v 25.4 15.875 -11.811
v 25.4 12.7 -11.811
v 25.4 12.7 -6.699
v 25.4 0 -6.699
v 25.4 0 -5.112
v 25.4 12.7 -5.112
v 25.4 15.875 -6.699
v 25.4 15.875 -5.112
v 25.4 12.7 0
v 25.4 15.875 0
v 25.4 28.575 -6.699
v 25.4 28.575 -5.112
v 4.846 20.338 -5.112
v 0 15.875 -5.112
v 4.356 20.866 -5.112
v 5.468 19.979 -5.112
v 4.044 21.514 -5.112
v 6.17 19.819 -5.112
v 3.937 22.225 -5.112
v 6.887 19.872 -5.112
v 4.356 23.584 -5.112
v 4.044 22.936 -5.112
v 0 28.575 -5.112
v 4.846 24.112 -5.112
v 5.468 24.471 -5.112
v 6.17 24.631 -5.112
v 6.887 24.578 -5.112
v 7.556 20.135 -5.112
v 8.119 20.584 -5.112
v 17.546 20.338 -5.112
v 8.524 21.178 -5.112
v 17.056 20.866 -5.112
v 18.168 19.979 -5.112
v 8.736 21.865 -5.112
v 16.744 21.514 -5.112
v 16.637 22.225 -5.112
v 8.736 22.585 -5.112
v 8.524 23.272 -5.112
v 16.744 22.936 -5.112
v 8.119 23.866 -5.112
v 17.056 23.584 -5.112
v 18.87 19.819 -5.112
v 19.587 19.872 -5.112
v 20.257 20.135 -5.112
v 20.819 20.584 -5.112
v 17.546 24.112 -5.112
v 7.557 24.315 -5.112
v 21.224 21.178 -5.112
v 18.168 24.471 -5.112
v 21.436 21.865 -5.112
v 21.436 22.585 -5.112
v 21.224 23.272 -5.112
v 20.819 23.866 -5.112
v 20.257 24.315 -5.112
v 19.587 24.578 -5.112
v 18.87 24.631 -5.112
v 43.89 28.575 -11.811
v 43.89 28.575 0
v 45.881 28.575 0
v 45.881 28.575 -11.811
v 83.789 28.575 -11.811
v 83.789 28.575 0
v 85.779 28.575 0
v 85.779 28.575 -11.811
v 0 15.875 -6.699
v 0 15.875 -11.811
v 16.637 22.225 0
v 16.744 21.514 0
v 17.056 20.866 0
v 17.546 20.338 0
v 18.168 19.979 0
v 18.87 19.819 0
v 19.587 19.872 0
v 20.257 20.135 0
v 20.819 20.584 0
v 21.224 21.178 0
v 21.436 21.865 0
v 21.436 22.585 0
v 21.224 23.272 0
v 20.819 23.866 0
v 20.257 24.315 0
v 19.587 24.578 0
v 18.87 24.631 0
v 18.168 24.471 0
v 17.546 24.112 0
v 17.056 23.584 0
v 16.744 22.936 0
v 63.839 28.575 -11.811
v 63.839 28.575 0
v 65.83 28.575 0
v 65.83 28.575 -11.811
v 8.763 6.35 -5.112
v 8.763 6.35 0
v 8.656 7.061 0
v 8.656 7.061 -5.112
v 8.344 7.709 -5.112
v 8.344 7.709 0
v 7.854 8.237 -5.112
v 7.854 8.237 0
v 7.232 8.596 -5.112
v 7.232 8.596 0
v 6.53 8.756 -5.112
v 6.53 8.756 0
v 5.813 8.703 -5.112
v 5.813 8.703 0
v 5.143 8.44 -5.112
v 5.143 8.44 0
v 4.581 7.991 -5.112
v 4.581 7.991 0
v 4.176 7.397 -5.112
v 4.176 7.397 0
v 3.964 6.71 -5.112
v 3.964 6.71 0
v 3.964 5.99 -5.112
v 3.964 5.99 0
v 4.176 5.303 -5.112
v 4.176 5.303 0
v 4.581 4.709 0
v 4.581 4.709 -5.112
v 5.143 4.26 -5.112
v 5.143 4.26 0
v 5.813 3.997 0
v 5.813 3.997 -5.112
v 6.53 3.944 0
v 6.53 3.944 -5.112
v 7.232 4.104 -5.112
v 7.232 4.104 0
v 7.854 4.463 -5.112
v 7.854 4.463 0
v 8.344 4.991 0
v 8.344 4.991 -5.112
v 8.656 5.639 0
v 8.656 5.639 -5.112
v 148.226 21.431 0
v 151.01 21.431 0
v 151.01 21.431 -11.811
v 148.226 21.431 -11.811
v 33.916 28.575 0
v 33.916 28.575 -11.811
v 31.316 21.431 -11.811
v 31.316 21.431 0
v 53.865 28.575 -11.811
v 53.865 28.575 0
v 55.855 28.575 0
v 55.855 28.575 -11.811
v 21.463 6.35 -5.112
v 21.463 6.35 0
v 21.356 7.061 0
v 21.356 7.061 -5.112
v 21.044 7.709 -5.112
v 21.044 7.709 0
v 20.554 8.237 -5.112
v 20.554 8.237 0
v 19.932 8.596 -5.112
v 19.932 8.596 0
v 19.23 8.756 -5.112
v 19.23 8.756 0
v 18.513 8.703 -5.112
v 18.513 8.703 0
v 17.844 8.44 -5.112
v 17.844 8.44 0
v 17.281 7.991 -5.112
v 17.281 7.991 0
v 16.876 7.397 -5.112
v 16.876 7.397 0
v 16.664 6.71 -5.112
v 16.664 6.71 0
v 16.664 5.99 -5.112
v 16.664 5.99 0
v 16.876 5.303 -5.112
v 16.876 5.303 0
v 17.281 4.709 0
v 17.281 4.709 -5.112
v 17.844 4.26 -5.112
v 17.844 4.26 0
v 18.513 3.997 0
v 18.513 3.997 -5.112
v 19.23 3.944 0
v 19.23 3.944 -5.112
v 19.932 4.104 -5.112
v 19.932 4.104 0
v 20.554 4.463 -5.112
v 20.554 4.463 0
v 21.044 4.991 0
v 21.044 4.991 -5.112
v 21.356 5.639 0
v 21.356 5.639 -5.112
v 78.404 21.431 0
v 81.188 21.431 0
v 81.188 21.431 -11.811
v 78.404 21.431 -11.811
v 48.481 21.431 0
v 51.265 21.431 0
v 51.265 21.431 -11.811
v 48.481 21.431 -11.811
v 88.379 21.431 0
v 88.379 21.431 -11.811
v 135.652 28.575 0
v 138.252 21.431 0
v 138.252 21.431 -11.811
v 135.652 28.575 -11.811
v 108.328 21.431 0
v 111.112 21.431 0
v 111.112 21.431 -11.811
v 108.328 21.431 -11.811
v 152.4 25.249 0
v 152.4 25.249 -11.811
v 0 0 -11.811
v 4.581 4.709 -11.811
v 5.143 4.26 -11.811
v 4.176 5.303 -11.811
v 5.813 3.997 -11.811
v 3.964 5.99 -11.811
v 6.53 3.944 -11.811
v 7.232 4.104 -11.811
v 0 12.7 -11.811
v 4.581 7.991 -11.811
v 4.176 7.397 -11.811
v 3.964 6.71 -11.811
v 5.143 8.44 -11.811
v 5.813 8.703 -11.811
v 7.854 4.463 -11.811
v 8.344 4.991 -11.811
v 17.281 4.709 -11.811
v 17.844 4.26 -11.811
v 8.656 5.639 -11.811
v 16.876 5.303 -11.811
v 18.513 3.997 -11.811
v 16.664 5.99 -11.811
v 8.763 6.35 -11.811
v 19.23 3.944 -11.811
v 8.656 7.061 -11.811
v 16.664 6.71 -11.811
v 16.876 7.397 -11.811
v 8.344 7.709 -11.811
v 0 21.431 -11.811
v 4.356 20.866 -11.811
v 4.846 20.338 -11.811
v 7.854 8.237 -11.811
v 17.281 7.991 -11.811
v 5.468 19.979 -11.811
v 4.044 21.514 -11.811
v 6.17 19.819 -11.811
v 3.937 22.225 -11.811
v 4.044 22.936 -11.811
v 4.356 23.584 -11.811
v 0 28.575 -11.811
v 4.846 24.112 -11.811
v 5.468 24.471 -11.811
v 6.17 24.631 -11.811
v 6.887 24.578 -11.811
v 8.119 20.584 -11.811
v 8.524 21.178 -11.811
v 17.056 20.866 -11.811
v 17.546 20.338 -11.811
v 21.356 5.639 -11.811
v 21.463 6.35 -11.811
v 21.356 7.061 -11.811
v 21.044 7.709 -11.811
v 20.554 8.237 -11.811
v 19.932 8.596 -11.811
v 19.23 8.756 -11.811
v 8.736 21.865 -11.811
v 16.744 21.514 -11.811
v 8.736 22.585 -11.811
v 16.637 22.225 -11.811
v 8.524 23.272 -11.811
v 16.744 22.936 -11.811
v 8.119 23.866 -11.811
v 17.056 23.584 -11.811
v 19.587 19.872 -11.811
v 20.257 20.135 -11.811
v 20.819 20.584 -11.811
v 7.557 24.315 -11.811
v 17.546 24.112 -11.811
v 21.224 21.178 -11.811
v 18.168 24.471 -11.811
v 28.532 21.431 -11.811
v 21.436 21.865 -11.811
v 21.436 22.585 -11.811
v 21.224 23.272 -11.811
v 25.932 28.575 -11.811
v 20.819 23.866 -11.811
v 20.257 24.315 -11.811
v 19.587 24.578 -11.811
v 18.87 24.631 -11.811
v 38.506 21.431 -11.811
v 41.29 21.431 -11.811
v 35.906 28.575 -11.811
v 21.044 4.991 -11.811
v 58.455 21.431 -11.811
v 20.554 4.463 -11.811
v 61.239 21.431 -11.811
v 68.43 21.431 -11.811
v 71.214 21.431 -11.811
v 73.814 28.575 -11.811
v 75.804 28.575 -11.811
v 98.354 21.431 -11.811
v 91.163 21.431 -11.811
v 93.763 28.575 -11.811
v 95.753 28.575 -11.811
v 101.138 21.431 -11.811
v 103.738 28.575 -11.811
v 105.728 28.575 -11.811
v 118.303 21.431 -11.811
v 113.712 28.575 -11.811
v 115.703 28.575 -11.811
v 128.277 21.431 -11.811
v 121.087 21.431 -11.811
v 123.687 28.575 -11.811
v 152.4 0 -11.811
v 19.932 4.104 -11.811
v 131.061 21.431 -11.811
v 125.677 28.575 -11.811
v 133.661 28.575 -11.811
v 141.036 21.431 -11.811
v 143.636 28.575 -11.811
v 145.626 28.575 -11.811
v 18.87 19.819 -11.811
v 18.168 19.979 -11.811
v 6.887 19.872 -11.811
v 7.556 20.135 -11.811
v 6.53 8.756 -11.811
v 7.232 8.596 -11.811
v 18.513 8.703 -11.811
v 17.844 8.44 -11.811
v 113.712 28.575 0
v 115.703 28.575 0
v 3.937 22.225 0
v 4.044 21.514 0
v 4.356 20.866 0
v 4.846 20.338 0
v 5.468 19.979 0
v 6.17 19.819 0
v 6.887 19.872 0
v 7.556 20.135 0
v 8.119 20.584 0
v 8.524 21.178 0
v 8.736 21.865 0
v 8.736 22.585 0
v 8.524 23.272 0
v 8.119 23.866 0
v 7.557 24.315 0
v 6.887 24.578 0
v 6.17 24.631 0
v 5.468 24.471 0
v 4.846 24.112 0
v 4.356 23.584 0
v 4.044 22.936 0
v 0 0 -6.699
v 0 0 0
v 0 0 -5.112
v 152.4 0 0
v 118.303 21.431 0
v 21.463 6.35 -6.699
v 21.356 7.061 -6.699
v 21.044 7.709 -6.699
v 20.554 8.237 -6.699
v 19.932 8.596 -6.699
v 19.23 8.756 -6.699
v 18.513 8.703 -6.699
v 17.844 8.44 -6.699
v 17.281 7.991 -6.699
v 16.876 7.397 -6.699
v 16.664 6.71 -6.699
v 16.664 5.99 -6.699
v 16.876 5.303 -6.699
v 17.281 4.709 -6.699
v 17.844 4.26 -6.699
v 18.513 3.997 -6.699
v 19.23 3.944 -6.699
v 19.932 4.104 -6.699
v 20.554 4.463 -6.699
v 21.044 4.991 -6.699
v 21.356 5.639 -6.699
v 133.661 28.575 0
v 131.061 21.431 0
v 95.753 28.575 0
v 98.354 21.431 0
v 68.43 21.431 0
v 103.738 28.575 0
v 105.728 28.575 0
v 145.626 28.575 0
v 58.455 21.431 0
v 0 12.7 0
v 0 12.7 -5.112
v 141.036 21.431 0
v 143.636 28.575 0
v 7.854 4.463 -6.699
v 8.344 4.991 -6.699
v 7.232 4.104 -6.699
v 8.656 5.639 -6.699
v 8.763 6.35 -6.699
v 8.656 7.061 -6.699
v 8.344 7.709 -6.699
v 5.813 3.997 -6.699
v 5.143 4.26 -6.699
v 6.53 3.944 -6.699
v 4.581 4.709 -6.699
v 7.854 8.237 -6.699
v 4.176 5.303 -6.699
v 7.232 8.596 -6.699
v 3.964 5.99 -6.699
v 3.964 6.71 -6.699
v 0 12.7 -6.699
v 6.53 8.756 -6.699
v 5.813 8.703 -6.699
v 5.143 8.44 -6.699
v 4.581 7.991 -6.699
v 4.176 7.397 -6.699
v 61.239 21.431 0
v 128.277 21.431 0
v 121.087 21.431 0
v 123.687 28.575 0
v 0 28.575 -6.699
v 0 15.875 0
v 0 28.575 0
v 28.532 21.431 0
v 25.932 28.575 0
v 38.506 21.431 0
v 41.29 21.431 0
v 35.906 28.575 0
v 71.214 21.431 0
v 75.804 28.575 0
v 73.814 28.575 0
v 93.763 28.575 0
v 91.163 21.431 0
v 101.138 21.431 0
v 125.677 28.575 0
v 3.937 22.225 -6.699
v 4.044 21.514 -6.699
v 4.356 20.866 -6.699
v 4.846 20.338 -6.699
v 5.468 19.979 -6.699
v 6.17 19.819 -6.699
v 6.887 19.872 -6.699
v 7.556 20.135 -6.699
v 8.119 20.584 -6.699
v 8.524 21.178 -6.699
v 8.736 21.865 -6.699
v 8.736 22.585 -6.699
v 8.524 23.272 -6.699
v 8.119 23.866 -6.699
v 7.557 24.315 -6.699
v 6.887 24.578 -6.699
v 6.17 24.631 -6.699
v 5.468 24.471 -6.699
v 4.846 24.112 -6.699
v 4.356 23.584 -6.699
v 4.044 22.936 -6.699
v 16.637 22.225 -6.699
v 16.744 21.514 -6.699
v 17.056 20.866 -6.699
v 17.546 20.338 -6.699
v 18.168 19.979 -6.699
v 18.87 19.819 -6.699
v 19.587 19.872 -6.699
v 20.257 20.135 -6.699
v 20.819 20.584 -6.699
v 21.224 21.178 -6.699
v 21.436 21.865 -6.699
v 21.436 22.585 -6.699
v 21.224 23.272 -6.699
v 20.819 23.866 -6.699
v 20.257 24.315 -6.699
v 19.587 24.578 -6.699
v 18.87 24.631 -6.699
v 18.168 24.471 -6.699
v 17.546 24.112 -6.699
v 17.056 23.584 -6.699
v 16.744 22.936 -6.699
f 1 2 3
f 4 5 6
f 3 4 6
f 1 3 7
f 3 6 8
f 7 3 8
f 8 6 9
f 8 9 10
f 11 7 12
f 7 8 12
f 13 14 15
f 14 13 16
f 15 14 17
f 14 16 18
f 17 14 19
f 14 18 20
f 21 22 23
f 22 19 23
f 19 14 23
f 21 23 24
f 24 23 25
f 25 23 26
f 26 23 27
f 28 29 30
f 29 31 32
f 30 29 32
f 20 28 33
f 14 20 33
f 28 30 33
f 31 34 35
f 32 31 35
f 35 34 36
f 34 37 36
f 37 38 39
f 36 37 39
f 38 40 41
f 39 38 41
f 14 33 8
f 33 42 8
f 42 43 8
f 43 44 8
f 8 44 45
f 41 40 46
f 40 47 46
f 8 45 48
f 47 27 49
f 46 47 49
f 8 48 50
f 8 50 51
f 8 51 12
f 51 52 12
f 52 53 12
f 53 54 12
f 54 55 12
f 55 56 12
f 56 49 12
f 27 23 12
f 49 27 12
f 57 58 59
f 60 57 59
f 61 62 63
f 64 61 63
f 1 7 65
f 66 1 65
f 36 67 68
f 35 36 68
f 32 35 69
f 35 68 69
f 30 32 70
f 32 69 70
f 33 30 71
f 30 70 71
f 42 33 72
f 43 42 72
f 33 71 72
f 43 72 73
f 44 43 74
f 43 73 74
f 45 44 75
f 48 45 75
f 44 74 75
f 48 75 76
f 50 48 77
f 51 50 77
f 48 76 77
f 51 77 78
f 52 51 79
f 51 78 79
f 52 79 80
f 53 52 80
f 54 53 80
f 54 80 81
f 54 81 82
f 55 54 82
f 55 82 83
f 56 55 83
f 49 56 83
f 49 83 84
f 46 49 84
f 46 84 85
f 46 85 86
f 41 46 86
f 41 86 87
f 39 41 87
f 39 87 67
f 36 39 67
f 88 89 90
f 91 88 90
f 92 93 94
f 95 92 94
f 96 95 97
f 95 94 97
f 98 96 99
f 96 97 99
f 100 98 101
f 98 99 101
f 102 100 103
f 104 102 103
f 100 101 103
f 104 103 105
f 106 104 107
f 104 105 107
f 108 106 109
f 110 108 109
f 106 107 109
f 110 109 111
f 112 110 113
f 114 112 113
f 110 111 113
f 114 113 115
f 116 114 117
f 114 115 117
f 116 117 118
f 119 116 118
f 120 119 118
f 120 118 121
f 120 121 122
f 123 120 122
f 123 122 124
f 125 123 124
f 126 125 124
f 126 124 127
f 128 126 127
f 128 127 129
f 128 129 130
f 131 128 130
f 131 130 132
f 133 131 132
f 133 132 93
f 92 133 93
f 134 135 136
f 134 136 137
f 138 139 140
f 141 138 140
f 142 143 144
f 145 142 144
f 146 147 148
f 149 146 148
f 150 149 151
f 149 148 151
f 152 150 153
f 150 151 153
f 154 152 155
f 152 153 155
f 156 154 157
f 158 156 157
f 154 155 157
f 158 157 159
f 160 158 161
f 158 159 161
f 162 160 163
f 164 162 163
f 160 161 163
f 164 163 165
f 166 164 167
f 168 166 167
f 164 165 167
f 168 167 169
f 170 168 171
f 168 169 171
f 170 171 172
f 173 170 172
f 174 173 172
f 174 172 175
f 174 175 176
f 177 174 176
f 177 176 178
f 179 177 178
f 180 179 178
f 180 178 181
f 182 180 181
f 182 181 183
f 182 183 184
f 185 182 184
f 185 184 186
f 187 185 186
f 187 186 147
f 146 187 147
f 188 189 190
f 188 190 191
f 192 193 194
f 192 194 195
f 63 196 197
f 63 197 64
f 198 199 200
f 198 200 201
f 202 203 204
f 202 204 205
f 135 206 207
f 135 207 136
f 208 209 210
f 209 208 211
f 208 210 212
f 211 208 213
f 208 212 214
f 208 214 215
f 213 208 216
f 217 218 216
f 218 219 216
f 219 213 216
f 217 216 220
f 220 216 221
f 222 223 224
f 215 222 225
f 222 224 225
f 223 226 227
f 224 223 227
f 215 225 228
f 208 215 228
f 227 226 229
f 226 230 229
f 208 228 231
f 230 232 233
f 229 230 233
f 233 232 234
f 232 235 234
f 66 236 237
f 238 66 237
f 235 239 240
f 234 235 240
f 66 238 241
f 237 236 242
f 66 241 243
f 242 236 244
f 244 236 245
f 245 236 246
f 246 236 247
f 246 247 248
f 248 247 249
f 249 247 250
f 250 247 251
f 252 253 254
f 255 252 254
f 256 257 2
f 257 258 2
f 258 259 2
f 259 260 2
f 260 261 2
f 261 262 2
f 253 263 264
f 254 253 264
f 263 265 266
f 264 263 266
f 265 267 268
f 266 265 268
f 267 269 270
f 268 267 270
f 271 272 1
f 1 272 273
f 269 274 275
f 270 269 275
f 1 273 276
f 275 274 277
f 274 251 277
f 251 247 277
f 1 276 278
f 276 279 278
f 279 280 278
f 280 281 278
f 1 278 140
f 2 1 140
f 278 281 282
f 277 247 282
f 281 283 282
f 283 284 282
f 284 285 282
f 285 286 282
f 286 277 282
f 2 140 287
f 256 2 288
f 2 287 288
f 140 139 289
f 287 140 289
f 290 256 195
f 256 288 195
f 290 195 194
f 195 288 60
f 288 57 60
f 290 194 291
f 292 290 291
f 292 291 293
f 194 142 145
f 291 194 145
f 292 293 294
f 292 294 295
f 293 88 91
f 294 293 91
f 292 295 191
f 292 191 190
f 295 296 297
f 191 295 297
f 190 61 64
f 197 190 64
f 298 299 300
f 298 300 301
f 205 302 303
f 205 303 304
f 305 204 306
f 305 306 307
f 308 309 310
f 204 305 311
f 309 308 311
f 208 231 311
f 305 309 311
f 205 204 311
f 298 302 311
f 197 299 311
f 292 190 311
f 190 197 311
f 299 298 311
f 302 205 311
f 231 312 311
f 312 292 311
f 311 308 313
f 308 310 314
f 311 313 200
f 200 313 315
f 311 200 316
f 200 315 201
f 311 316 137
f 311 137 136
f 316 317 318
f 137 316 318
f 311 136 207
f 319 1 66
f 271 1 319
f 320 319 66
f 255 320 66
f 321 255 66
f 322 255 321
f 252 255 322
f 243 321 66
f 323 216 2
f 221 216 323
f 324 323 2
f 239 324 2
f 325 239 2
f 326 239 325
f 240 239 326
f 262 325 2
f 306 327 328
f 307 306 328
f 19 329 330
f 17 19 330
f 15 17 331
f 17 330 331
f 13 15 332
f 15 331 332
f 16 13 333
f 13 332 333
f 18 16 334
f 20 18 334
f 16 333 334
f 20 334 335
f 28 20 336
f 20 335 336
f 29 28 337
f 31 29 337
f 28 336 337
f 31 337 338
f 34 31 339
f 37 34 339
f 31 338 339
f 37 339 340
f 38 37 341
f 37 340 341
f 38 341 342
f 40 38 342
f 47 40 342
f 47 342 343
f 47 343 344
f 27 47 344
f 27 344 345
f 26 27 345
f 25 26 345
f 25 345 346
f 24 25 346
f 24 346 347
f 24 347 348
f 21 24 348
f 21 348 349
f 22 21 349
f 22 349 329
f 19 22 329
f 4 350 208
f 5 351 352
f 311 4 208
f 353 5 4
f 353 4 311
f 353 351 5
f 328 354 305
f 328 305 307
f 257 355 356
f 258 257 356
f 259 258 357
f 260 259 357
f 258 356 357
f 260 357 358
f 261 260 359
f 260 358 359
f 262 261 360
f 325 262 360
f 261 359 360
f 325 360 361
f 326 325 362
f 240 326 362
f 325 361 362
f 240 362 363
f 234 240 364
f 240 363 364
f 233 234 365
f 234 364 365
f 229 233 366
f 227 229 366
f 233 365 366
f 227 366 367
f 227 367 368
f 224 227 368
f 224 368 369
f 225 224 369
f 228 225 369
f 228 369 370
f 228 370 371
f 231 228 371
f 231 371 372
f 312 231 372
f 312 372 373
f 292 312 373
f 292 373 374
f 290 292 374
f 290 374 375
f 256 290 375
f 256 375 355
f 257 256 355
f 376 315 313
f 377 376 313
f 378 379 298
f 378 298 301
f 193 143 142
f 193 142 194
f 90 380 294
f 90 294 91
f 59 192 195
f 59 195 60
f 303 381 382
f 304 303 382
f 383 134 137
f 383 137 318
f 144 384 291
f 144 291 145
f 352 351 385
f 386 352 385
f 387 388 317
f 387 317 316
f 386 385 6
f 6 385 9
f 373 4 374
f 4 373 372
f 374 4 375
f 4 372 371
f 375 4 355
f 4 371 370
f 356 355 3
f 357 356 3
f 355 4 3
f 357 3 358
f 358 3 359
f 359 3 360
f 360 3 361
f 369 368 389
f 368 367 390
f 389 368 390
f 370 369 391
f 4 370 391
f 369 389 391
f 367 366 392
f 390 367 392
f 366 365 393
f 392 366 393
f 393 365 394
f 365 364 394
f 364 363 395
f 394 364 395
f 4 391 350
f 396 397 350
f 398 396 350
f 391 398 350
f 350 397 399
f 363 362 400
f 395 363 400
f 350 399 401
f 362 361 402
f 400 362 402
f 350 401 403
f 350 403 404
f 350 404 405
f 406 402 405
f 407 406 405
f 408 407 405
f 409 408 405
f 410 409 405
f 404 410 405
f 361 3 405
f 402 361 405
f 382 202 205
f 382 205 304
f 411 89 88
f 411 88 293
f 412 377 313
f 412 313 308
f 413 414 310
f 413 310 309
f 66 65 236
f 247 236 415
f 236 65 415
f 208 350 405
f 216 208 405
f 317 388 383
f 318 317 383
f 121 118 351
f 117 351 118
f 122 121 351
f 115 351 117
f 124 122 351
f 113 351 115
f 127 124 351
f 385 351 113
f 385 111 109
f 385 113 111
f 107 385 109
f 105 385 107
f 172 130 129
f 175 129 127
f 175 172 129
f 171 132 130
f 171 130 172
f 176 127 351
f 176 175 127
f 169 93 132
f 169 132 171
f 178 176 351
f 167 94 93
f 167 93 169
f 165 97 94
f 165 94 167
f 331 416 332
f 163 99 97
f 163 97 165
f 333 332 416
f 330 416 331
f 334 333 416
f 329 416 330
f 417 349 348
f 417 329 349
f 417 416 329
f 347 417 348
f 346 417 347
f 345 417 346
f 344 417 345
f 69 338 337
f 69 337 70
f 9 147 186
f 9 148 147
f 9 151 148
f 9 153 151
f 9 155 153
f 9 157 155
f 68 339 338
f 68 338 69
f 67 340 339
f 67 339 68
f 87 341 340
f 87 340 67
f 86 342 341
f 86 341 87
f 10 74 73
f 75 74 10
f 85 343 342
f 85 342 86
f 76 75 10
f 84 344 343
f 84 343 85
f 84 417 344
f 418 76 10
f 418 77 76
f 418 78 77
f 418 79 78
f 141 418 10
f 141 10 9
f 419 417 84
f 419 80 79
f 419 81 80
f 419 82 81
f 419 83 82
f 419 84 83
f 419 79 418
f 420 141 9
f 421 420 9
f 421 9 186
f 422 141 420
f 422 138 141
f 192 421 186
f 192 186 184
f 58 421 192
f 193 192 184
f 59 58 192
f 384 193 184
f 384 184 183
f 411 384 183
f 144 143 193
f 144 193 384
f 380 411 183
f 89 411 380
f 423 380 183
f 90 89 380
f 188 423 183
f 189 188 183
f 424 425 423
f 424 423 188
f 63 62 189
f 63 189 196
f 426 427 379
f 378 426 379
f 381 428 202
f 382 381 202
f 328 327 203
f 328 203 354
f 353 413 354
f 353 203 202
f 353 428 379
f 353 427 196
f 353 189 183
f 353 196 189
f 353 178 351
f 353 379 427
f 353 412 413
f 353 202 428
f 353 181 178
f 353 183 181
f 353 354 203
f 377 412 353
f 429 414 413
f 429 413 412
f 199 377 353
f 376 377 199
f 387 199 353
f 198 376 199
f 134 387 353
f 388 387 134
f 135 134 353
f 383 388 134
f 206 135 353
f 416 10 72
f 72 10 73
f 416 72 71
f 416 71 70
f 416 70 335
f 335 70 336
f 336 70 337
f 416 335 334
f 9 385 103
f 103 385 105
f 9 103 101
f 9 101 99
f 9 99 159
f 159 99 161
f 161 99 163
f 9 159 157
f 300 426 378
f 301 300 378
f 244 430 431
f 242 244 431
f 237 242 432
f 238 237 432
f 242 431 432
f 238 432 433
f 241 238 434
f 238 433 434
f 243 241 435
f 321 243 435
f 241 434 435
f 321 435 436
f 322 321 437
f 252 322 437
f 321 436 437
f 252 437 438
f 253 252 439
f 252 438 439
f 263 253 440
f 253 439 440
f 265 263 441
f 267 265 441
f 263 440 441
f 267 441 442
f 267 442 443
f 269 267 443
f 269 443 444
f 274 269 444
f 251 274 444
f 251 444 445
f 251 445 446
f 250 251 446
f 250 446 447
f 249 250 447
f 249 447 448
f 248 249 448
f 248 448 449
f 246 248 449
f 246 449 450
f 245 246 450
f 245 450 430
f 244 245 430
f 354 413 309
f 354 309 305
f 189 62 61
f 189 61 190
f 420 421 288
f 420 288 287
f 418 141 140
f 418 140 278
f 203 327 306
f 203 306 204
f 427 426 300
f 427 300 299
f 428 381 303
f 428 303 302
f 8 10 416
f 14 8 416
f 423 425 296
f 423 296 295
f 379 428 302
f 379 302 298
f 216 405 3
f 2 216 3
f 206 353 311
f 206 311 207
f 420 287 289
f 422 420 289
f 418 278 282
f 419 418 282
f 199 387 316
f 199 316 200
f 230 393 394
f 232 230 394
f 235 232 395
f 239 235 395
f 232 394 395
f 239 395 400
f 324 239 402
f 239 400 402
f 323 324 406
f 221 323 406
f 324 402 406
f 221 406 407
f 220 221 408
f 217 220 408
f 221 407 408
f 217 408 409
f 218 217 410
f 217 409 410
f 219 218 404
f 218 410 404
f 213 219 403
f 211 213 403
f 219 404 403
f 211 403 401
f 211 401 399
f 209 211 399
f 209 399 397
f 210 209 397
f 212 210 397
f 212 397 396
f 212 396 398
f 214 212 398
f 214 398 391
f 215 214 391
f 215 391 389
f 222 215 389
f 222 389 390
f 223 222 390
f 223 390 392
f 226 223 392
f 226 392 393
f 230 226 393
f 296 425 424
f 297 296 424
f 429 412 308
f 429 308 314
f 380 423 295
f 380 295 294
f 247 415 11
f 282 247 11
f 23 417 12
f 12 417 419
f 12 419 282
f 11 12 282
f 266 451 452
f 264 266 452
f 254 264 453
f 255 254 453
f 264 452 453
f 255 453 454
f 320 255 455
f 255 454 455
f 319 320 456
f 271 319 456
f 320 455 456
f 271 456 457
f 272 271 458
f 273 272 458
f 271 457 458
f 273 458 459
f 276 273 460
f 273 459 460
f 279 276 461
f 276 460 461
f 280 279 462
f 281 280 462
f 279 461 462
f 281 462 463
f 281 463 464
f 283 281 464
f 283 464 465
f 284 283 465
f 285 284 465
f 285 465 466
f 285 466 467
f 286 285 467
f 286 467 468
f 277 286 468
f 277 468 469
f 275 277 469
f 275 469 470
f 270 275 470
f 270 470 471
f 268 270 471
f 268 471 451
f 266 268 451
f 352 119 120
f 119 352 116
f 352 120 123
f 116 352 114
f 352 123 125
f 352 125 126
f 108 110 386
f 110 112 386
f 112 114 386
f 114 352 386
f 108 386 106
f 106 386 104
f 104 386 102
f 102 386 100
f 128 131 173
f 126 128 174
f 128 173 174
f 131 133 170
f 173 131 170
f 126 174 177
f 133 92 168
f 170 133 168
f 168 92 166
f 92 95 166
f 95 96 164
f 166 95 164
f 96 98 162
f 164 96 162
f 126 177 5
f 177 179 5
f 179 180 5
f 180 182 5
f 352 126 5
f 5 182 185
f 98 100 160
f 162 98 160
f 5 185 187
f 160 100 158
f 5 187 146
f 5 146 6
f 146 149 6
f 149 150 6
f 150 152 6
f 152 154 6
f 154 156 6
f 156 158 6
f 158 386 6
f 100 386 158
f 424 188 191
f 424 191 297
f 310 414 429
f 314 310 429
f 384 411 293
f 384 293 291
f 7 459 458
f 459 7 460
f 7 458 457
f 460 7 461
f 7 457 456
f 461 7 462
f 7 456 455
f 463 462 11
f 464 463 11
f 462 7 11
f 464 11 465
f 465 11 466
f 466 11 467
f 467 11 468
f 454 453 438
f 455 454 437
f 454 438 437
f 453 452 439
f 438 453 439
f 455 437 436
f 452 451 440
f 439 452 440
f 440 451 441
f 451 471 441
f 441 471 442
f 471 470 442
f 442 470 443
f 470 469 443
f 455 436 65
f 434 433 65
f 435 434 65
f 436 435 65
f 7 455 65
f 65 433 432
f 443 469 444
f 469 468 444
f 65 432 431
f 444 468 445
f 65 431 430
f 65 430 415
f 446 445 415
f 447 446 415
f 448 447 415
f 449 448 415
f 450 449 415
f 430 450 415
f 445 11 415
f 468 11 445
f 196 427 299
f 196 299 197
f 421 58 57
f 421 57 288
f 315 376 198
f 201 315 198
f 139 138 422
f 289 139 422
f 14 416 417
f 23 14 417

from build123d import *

# Parameters (mm, degrees)
BLANKSKE_W              = 152.4
BLANKSKE_H              = 28.575
BLANK_DEPTH             = 11.811
TOOTHCUTSIM_DEPTH       = 156.504952802
TEETHCUTS_COUNT         = 16
TEETHCUTS_PITCH         = 9.974556664
SKETCH2_W               = 23.941257987
SKETCH2_H               = 28.575
BOSS_EXTRUDE1_DEPTH     = 11.811
CUT_EXTRUDE1_DEPTH      = 156.504952802
CUT_EXTRUDE1_DEPTH_BACK = 156.504952802
CUT_EXTRUDE5_DEPTH      = 156.504952802
CUT_EXTRUDE5_DEPTH_BACK = 156.504952802
SKETCH5_R               = 2.413
CUT_EXTRUDE6_DEPTH      = 12.446


with BuildPart() as part:
    # BlankSke → Blank (new body)
    with BuildSketch(Plane.XY):
        with Locations((76.2, 14.2875)):
            Rectangle(BLANKSKE_W, BLANKSKE_H)
    extrude(amount=-BLANK_DEPTH)

    # TooCutSkeSim → ToothCutSim (cut, through all)
    with BuildSketch(Plane.XY):
        Polygon((1.392032299, 21.43125), (-1.392032299, 21.43125), (-4.001389504, 28.6004), (4.001389504, 28.6004), align=None)
    toothcutsim = extrude(amount=-TOOTHCUTSIM_DEPTH, mode=Mode.SUBTRACT)

    # TeethCuts: ToothCutSim ×16
    with Locations(*[(i * TEETHCUTS_PITCH, 0, 0) for i in range(1, TEETHCUTS_COUNT)]):
        add(toothcutsim, mode=Mode.SUBTRACT)

    # Sketch2 → Boss-Extrude1 (add)
    with BuildSketch(Plane.XY):
        with Locations((11.970628994, 14.2875)):
            Rectangle(SKETCH2_W, SKETCH2_H)
    extrude(amount=-BOSS_EXTRUDE1_DEPTH)

    # Sketch3 → Cut-Extrude1 (cut, two sides)
    with BuildSketch(Plane.XY) as cut_extrude1_sk:
        Polygon((-316.449184205, 12.7), (0, 12.7), (25.4, 12.7), (25.4, 15.875), (0, 15.875), (-316.449184205, 15.875), (-949.347552615, 15.875), (-949.347552615, 12.7), align=None)
    extrude(amount=CUT_EXTRUDE1_DEPTH, mode=Mode.SUBTRACT)
    extrude(cut_extrude1_sk.sketch, amount=-CUT_EXTRUDE1_DEPTH_BACK, mode=Mode.SUBTRACT)

    # Sketch4 → Cut-Extrude5 (cut, two sides)
    with BuildSketch(Plane(origin=(0, 28.575, 0), x_dir=(1, 0, 0), z_dir=(0, 1, 0))) as cut_extrude5_sk:
        Polygon((-315.09434574, 6.69925), (0, 6.69925), (25.4, 6.69925), (25.4, 5.11175), (0, 5.11175), (-315.09434574, 5.11175), (-945.283037219, 5.11175), (-945.283037219, 6.69925), align=None)
    extrude(amount=CUT_EXTRUDE5_DEPTH, mode=Mode.SUBTRACT)
    extrude(cut_extrude5_sk.sketch, amount=-CUT_EXTRUDE5_DEPTH_BACK, mode=Mode.SUBTRACT)

    # Sketch5 → Cut-Extrude6 (cut)
    with BuildSketch(Plane.XY):
        with Locations(Location((6.35, 22.225, 0), (0, 0, 180))):
            Circle(SKETCH5_R)
        with Locations(Location((19.05, 22.225, 0), (0, 0, 180))):
            Circle(SKETCH5_R)
        with Locations((19.05, 6.35)):
            Circle(SKETCH5_R)
        with Locations((6.35, 6.35)):
            Circle(SKETCH5_R)
    extrude(amount=-CUT_EXTRUDE6_DEPTH, mode=Mode.SUBTRACT)


solid = part.part
